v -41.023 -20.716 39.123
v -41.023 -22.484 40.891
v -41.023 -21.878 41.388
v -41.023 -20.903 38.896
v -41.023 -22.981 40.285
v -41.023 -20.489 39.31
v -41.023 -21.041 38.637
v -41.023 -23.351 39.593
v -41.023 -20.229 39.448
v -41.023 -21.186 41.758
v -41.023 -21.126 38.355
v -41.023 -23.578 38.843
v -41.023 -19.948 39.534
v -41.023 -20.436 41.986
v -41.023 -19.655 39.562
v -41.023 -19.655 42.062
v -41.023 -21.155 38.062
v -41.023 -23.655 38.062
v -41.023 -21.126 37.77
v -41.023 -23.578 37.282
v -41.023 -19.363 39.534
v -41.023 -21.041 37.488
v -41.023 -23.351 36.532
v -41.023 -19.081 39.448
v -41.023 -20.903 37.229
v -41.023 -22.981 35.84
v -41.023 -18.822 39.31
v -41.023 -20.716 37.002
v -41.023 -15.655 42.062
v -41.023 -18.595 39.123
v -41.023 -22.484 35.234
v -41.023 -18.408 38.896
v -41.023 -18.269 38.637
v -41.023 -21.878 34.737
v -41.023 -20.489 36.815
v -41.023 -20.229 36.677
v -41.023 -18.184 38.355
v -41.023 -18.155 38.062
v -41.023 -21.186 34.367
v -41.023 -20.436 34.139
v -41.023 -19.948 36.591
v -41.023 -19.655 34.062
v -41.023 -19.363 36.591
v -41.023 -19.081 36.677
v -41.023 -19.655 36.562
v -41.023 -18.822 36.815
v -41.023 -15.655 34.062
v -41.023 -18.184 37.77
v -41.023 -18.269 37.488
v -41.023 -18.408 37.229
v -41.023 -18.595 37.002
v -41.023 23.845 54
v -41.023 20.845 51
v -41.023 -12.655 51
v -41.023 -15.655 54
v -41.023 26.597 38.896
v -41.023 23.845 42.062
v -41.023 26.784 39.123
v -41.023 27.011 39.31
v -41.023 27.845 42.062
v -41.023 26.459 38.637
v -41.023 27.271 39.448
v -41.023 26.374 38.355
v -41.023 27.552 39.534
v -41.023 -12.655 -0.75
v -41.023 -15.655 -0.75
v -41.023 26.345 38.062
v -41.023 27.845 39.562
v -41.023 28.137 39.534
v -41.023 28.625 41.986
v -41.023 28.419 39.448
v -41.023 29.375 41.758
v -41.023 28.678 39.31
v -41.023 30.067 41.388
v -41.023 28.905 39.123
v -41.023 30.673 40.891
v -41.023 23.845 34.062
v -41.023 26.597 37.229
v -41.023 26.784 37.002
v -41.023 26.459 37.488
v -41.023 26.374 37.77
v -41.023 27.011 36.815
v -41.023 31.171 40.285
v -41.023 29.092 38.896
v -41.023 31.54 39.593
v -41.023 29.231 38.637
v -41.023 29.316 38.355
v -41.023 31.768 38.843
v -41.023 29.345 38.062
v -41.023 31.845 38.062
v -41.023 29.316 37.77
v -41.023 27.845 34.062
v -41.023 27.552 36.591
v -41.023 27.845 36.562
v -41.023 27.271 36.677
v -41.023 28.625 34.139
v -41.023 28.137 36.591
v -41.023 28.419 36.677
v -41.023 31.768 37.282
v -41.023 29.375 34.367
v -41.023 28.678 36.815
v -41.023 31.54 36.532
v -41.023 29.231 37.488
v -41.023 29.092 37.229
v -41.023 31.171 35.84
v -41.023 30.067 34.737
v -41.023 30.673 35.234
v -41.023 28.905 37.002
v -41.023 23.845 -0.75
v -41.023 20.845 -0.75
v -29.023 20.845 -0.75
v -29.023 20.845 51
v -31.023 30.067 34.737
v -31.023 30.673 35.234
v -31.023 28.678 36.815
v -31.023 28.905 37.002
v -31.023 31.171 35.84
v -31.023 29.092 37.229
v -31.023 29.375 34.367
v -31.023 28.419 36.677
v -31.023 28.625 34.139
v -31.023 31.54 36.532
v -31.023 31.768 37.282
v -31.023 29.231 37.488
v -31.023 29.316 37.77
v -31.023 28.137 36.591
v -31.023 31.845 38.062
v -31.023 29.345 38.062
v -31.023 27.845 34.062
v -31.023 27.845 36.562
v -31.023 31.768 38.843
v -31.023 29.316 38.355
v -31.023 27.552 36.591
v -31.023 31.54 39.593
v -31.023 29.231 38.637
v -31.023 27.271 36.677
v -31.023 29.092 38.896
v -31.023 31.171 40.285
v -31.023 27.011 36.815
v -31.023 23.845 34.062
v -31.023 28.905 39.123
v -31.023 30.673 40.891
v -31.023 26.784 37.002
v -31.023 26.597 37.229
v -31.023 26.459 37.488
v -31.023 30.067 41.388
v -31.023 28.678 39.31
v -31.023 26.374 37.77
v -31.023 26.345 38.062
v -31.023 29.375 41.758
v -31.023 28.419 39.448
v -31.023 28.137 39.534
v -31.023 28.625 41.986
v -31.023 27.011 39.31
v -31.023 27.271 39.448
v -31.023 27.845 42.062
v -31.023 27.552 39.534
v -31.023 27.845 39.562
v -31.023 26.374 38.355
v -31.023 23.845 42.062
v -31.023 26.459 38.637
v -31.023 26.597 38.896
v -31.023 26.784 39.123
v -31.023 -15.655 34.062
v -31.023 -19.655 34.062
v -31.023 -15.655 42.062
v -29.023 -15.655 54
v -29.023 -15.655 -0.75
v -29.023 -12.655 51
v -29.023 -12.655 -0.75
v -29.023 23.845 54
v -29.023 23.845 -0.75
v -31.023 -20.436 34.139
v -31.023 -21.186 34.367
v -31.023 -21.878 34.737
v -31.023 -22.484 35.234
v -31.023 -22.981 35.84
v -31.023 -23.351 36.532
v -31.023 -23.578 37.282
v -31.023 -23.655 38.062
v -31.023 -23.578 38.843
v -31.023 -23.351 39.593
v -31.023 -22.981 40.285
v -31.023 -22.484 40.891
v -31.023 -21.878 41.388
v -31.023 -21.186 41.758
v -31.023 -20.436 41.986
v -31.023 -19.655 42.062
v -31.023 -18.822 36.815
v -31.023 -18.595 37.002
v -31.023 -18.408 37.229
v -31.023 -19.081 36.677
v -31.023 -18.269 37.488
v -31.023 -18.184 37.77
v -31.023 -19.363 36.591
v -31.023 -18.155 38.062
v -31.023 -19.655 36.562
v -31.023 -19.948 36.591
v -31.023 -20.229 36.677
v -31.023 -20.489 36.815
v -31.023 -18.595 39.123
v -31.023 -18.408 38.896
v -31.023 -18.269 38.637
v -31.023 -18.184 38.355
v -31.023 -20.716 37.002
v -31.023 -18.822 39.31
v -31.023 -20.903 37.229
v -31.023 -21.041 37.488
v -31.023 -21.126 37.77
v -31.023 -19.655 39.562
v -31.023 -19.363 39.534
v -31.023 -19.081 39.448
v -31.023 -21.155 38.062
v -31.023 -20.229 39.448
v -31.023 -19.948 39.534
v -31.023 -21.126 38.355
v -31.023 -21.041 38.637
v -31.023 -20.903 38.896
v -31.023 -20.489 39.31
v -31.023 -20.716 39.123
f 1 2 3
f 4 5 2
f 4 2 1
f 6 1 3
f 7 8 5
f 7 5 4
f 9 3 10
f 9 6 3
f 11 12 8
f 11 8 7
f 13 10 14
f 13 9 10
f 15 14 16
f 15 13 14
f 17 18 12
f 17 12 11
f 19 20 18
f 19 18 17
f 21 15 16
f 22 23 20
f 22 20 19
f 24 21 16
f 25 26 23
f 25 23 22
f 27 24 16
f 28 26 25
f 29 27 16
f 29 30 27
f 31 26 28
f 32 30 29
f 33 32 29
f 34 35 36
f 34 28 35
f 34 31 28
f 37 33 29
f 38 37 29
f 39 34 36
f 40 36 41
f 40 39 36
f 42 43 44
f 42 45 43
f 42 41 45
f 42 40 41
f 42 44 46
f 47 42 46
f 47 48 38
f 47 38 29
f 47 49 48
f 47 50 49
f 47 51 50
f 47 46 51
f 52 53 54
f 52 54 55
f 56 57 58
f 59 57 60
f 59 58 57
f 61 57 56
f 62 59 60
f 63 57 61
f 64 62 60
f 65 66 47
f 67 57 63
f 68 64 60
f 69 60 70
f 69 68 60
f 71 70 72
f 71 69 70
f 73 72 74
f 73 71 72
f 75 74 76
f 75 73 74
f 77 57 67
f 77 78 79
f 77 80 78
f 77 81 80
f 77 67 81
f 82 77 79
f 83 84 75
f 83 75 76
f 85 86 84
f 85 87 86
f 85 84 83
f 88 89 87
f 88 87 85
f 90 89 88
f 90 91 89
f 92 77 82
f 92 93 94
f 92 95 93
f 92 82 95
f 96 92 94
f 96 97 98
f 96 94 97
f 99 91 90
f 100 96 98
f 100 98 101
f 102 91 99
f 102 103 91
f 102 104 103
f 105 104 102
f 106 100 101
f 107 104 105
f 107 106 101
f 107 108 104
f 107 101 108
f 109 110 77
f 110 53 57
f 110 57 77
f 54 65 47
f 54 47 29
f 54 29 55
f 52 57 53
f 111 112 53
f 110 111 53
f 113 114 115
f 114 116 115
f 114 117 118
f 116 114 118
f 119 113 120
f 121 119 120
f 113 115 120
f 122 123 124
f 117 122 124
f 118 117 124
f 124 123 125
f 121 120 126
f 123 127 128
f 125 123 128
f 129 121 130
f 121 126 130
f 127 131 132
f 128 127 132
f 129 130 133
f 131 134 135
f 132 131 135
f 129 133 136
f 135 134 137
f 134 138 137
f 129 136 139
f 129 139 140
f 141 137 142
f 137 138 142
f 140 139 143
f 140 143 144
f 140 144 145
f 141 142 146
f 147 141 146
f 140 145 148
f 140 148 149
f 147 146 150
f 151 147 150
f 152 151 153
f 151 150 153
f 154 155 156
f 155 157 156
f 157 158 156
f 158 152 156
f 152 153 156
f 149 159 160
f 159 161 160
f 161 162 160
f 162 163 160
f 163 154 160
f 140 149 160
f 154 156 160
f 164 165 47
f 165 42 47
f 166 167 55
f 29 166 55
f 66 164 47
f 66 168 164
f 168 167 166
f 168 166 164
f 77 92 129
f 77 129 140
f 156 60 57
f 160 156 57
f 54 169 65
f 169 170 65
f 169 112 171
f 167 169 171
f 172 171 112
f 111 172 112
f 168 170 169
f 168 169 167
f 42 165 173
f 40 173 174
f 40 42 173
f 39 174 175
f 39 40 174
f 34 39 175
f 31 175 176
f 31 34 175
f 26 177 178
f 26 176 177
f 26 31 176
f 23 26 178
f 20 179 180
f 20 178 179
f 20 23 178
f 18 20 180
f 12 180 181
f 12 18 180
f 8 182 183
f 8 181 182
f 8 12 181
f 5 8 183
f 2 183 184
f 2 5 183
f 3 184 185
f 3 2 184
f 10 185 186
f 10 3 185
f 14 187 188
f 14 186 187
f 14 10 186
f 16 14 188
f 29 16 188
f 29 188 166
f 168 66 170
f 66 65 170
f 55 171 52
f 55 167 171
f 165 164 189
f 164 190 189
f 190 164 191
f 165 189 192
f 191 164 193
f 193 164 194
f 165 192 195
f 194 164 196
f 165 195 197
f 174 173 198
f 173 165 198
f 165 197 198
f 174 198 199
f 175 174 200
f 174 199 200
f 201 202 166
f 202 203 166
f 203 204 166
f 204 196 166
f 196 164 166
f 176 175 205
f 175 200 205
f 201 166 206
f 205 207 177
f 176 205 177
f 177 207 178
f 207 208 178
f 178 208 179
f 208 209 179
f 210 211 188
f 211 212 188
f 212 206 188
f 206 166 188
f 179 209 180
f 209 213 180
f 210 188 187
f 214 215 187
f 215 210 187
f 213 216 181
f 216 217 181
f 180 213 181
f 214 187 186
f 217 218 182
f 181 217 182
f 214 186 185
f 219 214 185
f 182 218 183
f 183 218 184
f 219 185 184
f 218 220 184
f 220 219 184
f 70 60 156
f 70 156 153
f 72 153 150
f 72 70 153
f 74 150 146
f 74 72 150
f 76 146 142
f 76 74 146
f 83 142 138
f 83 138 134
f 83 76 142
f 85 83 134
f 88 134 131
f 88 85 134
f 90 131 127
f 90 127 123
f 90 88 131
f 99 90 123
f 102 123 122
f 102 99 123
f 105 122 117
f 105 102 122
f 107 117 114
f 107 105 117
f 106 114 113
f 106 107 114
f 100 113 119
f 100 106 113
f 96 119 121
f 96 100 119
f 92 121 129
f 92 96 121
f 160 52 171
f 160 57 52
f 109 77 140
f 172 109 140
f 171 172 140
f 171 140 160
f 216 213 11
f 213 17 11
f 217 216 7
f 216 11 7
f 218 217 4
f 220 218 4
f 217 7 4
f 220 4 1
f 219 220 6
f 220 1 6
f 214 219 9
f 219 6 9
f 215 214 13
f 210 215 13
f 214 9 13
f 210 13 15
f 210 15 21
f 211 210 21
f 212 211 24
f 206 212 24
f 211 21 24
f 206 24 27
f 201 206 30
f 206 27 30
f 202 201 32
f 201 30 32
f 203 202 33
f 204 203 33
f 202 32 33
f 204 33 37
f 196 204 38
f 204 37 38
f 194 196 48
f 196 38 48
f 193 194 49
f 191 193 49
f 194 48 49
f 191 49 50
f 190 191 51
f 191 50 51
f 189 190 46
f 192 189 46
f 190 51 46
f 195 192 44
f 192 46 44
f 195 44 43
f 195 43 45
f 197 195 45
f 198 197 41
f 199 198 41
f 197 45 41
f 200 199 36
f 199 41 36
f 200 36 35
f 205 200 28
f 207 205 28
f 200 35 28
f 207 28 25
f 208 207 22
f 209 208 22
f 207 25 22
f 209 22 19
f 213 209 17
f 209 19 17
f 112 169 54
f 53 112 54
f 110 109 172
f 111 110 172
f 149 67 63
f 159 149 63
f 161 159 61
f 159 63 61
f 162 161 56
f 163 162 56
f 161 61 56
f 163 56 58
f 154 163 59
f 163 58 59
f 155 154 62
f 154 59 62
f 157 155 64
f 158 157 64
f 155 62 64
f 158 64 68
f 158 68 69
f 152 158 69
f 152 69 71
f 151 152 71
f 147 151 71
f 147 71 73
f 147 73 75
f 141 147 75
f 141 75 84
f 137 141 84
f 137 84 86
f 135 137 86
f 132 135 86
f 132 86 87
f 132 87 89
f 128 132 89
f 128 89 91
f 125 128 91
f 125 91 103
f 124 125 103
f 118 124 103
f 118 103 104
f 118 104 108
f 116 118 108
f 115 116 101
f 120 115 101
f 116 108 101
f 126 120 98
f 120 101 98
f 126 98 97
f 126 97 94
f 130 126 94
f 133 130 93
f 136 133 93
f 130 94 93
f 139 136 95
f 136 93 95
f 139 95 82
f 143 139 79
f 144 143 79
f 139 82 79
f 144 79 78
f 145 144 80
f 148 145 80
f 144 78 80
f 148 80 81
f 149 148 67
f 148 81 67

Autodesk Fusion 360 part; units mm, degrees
sketch "Boceto1" plane through (0, 0, 0) normal (0, 0, 1) x (1, 0, 0)
  line L0 (-38.0232, 20.8447) -> (47.9768, 20.8447)
  line L1 (47.9768, 20.8447) -> (47.9768, -12.6553)
  line L2 (47.9768, -12.6553) -> (-38.0232, -12.6553)
  line L3 (-38.0232, -12.6553) -> (-38.0232, 20.8447)
  line L4 (-41.0232, 23.8447) -> (50.9768, 23.8447)
  line L5 (50.9768, -15.6553) -> (-41.0232, -15.6553)
  line L6 (-38.0232, 20.8447) -> (-41.0232, 20.8447)
  line L7 (-41.0232, 20.8447) -> (50.9768, 20.8447)
  line L8 (-38.0232, -12.6553) -> (-41.0232, -12.6553)
  line L9 (-41.0232, -15.6553) -> (-41.0232, -12.6553)
  line L10 (-41.0232, 20.8447) -> (-41.0232, 23.8447)
  line L11 (47.9768, -12.6553) -> (50.9768, -12.6553)
  line L12 (50.9768, 23.8447) -> (50.9768, 20.8447)
  line L13 (50.9768, -12.6553) -> (50.9768, -15.6553)
  dimension "d1" = 86
  dimension "d2" = 33.5
  dimension "d3" = 3
  dimension "d4" = 3
  dimension "d5" = 3
  dimension "d6" = 3
extrude "Extruir1" add sketch "Boceto1" along normal blind 51 contours L0 L4 L6 L7 L10 L12 | L2 L5 L8 L9 L11 L13 makes body 1 at (20.3102, 20.8447, 17) makes body 2 at (20.3102, -12.6553, 17)
sketch "Boceto2" plane through (0, 0, 51) normal (0, 0, 1) x (-1, 0, 0)
  line L0 (41.0232, -20.8447) -> (-50.9768, -20.8447)
  line L1 (-50.9768, -20.8447) -> (-50.9768, -23.8447)
  line L2 (-50.9768, -23.8447) -> (41.0232, -23.8447)
  line L3 (41.0232, -23.8447) -> (41.0232, -20.8447)
  line L4 (41.0232, -23.8447) -> (-50.9768, -23.8447)
  line L5 (-50.9768, -23.8447) -> (-50.9768, 15.6553)
  line L6 (-50.9768, 15.6553) -> (41.0232, 15.6553)
  line L7 (41.0232, 15.6553) -> (41.0232, -23.8447)
  dimension "d9" = 39.5
  dimension "d12" = 92
extrude "Extruir2" add sketch "Boceto2" along normal blind 3 bodies 1 2
sketch "Boceto3" plane through (0, 0, 51) normal (0, 0, -1) x (1, 0, 0)
  line L0 (-41.0232, -20.8447) -> (50.9768, -20.8447)
  line L1 (50.9768, -20.8447) -> (50.9768, 12.6553)
  line L2 (50.9768, 12.6553) -> (-41.0232, 12.6553)
  line L3 (-41.0232, 12.6553) -> (-41.0232, -20.8447)
  line L4 (50.9768, 12.6553) -> (47.9768, 12.6553)
  line L5 (47.9768, 12.6553) -> (47.9768, 5.6553)
  line L6 (47.9768, 5.6553) -> (50.9768, 5.6553)
  line L7 (50.9768, 5.6553) -> (50.9768, 12.6553)
  line L8 (50.9768, -20.8447) -> (47.9768, -20.8447)
  line L9 (47.9768, -20.8447) -> (47.9768, -13.8447)
  line L10 (47.9768, -13.8447) -> (50.9768, -13.8447)
  line L11 (50.9768, -13.8447) -> (50.9768, -20.8447)
  dimension "d13" = 3
  dimension "d14" = 3
  dimension "d16" = 7
  dimension "d17" = 7
extrude "Extruir3" add sketch "Boceto3" along normal blind 51 contours L0 L1 L8 L9 L10 L11 | L1 L2 L4 L5 L6 L7 bodies 1
extrude "Extruir4" cut 1 faces at (50.9768, -12.322, 35) along direction (-1, 0, 0) blind 80 on bodies 1 bodies 1
extrude "Extruir5" add 2 faces at (-37.0232, -14.6553, 0) (-37.0232, 22.8447, 0) along direction (0, 0, -1) blind 0.75 on bodies 1 bodies 1
sketch "Boceto4" plane through (0, 0, -0.75) normal (0, 0, -1) x (1, 0, 0)
  line L0 (-29.0232, -23.8447) -> (-29.0232, -20.8447)
  line L1 (-29.0232, -20.8447) -> (-41.0232, -20.8447)
  line L2 (-41.0232, -20.8447) -> (-41.0232, -23.8447)
  line L3 (-41.0232, -23.8447) -> (-29.0232, -23.8447)
  line L4 (-35.0232, -23.8447) -> (-35.0232, -27.8447) construction
  dimension "d24" = 4
sketch "Boceto5" plane through (-41.0232, 0, 0) normal (-1, 0, 0) x (0, -1, 0)
  line L0 (-20.8447, -0.75) -> (-20.8447, 51)
  line L1 (-20.8447, 51) -> (12.6553, 51)
  line L2 (12.6553, 51) -> (12.6553, -0.75)
  line L3 (12.6553, -0.75) -> (15.6553, -0.75)
  line L4 (15.6553, -0.75) -> (15.6553, 54)
  line L5 (15.6553, 54) -> (-23.8447, 54)
  line L6 (-23.8447, 54) -> (-23.8447, -0.75)
  line L7 (-23.8447, -0.75) -> (-20.8447, -0.75)
  line L8 (15.6553, -0.75) -> (15.6553, 51) construction
  line L9 (12.6553, -0.75) -> (-20.8447, -0.75) construction
  line L10 (-4.0947, -0.75) -> (-4.0947, 51) construction
  line L11 (-4.0947, 25.125) -> (-4.0947, 51) construction
  line L12 (-4.0947, 38.0625) -> (-23.8447, 38.0625) construction
  line L13 (-4.0947, 38.0625) -> (12.6553, 38.0625) construction
  line L14 (12.6553, 38.0625) -> (19.6553, 38.0625) construction
  line L15 (-23.8447, 38.0625) -> (-27.8447, 38.0625) construction
  circle A0 centre (-27.8447, 38.0625) radius 4
  line L16 (-27.8447, 42.0625) -> (-23.8447, 42.0625)
  line L17 (-27.8447, 34.0625) -> (-23.8447, 34.0625)
  circle A1 centre (-27.8447, 38.0625) radius 1.5
  line L18 (19.6553, 42.0625) -> (15.6553, 42.0625)
  circle A2 centre (19.6553, 38.0625) radius 4
  circle A3 centre (19.6553, 38.0625) radius 1.5
  line L19 (19.6553, 34.0625) -> (15.6553, 34.0625)
  dimension "d25" = 7
  dimension "d26" = 4
  dimension "d27" = 3
extrude "Extruir6" add sketch "Boceto5" against normal blind 10 contours L6 A0 L17 | L6 A0 L16 | A0 | L4 A2 L19 | L4 L18 A2 | A2 bodies 1
equation "d12 = 86 mm + 6 mm"
equation "d25 = 3 mm + 4 mm"
